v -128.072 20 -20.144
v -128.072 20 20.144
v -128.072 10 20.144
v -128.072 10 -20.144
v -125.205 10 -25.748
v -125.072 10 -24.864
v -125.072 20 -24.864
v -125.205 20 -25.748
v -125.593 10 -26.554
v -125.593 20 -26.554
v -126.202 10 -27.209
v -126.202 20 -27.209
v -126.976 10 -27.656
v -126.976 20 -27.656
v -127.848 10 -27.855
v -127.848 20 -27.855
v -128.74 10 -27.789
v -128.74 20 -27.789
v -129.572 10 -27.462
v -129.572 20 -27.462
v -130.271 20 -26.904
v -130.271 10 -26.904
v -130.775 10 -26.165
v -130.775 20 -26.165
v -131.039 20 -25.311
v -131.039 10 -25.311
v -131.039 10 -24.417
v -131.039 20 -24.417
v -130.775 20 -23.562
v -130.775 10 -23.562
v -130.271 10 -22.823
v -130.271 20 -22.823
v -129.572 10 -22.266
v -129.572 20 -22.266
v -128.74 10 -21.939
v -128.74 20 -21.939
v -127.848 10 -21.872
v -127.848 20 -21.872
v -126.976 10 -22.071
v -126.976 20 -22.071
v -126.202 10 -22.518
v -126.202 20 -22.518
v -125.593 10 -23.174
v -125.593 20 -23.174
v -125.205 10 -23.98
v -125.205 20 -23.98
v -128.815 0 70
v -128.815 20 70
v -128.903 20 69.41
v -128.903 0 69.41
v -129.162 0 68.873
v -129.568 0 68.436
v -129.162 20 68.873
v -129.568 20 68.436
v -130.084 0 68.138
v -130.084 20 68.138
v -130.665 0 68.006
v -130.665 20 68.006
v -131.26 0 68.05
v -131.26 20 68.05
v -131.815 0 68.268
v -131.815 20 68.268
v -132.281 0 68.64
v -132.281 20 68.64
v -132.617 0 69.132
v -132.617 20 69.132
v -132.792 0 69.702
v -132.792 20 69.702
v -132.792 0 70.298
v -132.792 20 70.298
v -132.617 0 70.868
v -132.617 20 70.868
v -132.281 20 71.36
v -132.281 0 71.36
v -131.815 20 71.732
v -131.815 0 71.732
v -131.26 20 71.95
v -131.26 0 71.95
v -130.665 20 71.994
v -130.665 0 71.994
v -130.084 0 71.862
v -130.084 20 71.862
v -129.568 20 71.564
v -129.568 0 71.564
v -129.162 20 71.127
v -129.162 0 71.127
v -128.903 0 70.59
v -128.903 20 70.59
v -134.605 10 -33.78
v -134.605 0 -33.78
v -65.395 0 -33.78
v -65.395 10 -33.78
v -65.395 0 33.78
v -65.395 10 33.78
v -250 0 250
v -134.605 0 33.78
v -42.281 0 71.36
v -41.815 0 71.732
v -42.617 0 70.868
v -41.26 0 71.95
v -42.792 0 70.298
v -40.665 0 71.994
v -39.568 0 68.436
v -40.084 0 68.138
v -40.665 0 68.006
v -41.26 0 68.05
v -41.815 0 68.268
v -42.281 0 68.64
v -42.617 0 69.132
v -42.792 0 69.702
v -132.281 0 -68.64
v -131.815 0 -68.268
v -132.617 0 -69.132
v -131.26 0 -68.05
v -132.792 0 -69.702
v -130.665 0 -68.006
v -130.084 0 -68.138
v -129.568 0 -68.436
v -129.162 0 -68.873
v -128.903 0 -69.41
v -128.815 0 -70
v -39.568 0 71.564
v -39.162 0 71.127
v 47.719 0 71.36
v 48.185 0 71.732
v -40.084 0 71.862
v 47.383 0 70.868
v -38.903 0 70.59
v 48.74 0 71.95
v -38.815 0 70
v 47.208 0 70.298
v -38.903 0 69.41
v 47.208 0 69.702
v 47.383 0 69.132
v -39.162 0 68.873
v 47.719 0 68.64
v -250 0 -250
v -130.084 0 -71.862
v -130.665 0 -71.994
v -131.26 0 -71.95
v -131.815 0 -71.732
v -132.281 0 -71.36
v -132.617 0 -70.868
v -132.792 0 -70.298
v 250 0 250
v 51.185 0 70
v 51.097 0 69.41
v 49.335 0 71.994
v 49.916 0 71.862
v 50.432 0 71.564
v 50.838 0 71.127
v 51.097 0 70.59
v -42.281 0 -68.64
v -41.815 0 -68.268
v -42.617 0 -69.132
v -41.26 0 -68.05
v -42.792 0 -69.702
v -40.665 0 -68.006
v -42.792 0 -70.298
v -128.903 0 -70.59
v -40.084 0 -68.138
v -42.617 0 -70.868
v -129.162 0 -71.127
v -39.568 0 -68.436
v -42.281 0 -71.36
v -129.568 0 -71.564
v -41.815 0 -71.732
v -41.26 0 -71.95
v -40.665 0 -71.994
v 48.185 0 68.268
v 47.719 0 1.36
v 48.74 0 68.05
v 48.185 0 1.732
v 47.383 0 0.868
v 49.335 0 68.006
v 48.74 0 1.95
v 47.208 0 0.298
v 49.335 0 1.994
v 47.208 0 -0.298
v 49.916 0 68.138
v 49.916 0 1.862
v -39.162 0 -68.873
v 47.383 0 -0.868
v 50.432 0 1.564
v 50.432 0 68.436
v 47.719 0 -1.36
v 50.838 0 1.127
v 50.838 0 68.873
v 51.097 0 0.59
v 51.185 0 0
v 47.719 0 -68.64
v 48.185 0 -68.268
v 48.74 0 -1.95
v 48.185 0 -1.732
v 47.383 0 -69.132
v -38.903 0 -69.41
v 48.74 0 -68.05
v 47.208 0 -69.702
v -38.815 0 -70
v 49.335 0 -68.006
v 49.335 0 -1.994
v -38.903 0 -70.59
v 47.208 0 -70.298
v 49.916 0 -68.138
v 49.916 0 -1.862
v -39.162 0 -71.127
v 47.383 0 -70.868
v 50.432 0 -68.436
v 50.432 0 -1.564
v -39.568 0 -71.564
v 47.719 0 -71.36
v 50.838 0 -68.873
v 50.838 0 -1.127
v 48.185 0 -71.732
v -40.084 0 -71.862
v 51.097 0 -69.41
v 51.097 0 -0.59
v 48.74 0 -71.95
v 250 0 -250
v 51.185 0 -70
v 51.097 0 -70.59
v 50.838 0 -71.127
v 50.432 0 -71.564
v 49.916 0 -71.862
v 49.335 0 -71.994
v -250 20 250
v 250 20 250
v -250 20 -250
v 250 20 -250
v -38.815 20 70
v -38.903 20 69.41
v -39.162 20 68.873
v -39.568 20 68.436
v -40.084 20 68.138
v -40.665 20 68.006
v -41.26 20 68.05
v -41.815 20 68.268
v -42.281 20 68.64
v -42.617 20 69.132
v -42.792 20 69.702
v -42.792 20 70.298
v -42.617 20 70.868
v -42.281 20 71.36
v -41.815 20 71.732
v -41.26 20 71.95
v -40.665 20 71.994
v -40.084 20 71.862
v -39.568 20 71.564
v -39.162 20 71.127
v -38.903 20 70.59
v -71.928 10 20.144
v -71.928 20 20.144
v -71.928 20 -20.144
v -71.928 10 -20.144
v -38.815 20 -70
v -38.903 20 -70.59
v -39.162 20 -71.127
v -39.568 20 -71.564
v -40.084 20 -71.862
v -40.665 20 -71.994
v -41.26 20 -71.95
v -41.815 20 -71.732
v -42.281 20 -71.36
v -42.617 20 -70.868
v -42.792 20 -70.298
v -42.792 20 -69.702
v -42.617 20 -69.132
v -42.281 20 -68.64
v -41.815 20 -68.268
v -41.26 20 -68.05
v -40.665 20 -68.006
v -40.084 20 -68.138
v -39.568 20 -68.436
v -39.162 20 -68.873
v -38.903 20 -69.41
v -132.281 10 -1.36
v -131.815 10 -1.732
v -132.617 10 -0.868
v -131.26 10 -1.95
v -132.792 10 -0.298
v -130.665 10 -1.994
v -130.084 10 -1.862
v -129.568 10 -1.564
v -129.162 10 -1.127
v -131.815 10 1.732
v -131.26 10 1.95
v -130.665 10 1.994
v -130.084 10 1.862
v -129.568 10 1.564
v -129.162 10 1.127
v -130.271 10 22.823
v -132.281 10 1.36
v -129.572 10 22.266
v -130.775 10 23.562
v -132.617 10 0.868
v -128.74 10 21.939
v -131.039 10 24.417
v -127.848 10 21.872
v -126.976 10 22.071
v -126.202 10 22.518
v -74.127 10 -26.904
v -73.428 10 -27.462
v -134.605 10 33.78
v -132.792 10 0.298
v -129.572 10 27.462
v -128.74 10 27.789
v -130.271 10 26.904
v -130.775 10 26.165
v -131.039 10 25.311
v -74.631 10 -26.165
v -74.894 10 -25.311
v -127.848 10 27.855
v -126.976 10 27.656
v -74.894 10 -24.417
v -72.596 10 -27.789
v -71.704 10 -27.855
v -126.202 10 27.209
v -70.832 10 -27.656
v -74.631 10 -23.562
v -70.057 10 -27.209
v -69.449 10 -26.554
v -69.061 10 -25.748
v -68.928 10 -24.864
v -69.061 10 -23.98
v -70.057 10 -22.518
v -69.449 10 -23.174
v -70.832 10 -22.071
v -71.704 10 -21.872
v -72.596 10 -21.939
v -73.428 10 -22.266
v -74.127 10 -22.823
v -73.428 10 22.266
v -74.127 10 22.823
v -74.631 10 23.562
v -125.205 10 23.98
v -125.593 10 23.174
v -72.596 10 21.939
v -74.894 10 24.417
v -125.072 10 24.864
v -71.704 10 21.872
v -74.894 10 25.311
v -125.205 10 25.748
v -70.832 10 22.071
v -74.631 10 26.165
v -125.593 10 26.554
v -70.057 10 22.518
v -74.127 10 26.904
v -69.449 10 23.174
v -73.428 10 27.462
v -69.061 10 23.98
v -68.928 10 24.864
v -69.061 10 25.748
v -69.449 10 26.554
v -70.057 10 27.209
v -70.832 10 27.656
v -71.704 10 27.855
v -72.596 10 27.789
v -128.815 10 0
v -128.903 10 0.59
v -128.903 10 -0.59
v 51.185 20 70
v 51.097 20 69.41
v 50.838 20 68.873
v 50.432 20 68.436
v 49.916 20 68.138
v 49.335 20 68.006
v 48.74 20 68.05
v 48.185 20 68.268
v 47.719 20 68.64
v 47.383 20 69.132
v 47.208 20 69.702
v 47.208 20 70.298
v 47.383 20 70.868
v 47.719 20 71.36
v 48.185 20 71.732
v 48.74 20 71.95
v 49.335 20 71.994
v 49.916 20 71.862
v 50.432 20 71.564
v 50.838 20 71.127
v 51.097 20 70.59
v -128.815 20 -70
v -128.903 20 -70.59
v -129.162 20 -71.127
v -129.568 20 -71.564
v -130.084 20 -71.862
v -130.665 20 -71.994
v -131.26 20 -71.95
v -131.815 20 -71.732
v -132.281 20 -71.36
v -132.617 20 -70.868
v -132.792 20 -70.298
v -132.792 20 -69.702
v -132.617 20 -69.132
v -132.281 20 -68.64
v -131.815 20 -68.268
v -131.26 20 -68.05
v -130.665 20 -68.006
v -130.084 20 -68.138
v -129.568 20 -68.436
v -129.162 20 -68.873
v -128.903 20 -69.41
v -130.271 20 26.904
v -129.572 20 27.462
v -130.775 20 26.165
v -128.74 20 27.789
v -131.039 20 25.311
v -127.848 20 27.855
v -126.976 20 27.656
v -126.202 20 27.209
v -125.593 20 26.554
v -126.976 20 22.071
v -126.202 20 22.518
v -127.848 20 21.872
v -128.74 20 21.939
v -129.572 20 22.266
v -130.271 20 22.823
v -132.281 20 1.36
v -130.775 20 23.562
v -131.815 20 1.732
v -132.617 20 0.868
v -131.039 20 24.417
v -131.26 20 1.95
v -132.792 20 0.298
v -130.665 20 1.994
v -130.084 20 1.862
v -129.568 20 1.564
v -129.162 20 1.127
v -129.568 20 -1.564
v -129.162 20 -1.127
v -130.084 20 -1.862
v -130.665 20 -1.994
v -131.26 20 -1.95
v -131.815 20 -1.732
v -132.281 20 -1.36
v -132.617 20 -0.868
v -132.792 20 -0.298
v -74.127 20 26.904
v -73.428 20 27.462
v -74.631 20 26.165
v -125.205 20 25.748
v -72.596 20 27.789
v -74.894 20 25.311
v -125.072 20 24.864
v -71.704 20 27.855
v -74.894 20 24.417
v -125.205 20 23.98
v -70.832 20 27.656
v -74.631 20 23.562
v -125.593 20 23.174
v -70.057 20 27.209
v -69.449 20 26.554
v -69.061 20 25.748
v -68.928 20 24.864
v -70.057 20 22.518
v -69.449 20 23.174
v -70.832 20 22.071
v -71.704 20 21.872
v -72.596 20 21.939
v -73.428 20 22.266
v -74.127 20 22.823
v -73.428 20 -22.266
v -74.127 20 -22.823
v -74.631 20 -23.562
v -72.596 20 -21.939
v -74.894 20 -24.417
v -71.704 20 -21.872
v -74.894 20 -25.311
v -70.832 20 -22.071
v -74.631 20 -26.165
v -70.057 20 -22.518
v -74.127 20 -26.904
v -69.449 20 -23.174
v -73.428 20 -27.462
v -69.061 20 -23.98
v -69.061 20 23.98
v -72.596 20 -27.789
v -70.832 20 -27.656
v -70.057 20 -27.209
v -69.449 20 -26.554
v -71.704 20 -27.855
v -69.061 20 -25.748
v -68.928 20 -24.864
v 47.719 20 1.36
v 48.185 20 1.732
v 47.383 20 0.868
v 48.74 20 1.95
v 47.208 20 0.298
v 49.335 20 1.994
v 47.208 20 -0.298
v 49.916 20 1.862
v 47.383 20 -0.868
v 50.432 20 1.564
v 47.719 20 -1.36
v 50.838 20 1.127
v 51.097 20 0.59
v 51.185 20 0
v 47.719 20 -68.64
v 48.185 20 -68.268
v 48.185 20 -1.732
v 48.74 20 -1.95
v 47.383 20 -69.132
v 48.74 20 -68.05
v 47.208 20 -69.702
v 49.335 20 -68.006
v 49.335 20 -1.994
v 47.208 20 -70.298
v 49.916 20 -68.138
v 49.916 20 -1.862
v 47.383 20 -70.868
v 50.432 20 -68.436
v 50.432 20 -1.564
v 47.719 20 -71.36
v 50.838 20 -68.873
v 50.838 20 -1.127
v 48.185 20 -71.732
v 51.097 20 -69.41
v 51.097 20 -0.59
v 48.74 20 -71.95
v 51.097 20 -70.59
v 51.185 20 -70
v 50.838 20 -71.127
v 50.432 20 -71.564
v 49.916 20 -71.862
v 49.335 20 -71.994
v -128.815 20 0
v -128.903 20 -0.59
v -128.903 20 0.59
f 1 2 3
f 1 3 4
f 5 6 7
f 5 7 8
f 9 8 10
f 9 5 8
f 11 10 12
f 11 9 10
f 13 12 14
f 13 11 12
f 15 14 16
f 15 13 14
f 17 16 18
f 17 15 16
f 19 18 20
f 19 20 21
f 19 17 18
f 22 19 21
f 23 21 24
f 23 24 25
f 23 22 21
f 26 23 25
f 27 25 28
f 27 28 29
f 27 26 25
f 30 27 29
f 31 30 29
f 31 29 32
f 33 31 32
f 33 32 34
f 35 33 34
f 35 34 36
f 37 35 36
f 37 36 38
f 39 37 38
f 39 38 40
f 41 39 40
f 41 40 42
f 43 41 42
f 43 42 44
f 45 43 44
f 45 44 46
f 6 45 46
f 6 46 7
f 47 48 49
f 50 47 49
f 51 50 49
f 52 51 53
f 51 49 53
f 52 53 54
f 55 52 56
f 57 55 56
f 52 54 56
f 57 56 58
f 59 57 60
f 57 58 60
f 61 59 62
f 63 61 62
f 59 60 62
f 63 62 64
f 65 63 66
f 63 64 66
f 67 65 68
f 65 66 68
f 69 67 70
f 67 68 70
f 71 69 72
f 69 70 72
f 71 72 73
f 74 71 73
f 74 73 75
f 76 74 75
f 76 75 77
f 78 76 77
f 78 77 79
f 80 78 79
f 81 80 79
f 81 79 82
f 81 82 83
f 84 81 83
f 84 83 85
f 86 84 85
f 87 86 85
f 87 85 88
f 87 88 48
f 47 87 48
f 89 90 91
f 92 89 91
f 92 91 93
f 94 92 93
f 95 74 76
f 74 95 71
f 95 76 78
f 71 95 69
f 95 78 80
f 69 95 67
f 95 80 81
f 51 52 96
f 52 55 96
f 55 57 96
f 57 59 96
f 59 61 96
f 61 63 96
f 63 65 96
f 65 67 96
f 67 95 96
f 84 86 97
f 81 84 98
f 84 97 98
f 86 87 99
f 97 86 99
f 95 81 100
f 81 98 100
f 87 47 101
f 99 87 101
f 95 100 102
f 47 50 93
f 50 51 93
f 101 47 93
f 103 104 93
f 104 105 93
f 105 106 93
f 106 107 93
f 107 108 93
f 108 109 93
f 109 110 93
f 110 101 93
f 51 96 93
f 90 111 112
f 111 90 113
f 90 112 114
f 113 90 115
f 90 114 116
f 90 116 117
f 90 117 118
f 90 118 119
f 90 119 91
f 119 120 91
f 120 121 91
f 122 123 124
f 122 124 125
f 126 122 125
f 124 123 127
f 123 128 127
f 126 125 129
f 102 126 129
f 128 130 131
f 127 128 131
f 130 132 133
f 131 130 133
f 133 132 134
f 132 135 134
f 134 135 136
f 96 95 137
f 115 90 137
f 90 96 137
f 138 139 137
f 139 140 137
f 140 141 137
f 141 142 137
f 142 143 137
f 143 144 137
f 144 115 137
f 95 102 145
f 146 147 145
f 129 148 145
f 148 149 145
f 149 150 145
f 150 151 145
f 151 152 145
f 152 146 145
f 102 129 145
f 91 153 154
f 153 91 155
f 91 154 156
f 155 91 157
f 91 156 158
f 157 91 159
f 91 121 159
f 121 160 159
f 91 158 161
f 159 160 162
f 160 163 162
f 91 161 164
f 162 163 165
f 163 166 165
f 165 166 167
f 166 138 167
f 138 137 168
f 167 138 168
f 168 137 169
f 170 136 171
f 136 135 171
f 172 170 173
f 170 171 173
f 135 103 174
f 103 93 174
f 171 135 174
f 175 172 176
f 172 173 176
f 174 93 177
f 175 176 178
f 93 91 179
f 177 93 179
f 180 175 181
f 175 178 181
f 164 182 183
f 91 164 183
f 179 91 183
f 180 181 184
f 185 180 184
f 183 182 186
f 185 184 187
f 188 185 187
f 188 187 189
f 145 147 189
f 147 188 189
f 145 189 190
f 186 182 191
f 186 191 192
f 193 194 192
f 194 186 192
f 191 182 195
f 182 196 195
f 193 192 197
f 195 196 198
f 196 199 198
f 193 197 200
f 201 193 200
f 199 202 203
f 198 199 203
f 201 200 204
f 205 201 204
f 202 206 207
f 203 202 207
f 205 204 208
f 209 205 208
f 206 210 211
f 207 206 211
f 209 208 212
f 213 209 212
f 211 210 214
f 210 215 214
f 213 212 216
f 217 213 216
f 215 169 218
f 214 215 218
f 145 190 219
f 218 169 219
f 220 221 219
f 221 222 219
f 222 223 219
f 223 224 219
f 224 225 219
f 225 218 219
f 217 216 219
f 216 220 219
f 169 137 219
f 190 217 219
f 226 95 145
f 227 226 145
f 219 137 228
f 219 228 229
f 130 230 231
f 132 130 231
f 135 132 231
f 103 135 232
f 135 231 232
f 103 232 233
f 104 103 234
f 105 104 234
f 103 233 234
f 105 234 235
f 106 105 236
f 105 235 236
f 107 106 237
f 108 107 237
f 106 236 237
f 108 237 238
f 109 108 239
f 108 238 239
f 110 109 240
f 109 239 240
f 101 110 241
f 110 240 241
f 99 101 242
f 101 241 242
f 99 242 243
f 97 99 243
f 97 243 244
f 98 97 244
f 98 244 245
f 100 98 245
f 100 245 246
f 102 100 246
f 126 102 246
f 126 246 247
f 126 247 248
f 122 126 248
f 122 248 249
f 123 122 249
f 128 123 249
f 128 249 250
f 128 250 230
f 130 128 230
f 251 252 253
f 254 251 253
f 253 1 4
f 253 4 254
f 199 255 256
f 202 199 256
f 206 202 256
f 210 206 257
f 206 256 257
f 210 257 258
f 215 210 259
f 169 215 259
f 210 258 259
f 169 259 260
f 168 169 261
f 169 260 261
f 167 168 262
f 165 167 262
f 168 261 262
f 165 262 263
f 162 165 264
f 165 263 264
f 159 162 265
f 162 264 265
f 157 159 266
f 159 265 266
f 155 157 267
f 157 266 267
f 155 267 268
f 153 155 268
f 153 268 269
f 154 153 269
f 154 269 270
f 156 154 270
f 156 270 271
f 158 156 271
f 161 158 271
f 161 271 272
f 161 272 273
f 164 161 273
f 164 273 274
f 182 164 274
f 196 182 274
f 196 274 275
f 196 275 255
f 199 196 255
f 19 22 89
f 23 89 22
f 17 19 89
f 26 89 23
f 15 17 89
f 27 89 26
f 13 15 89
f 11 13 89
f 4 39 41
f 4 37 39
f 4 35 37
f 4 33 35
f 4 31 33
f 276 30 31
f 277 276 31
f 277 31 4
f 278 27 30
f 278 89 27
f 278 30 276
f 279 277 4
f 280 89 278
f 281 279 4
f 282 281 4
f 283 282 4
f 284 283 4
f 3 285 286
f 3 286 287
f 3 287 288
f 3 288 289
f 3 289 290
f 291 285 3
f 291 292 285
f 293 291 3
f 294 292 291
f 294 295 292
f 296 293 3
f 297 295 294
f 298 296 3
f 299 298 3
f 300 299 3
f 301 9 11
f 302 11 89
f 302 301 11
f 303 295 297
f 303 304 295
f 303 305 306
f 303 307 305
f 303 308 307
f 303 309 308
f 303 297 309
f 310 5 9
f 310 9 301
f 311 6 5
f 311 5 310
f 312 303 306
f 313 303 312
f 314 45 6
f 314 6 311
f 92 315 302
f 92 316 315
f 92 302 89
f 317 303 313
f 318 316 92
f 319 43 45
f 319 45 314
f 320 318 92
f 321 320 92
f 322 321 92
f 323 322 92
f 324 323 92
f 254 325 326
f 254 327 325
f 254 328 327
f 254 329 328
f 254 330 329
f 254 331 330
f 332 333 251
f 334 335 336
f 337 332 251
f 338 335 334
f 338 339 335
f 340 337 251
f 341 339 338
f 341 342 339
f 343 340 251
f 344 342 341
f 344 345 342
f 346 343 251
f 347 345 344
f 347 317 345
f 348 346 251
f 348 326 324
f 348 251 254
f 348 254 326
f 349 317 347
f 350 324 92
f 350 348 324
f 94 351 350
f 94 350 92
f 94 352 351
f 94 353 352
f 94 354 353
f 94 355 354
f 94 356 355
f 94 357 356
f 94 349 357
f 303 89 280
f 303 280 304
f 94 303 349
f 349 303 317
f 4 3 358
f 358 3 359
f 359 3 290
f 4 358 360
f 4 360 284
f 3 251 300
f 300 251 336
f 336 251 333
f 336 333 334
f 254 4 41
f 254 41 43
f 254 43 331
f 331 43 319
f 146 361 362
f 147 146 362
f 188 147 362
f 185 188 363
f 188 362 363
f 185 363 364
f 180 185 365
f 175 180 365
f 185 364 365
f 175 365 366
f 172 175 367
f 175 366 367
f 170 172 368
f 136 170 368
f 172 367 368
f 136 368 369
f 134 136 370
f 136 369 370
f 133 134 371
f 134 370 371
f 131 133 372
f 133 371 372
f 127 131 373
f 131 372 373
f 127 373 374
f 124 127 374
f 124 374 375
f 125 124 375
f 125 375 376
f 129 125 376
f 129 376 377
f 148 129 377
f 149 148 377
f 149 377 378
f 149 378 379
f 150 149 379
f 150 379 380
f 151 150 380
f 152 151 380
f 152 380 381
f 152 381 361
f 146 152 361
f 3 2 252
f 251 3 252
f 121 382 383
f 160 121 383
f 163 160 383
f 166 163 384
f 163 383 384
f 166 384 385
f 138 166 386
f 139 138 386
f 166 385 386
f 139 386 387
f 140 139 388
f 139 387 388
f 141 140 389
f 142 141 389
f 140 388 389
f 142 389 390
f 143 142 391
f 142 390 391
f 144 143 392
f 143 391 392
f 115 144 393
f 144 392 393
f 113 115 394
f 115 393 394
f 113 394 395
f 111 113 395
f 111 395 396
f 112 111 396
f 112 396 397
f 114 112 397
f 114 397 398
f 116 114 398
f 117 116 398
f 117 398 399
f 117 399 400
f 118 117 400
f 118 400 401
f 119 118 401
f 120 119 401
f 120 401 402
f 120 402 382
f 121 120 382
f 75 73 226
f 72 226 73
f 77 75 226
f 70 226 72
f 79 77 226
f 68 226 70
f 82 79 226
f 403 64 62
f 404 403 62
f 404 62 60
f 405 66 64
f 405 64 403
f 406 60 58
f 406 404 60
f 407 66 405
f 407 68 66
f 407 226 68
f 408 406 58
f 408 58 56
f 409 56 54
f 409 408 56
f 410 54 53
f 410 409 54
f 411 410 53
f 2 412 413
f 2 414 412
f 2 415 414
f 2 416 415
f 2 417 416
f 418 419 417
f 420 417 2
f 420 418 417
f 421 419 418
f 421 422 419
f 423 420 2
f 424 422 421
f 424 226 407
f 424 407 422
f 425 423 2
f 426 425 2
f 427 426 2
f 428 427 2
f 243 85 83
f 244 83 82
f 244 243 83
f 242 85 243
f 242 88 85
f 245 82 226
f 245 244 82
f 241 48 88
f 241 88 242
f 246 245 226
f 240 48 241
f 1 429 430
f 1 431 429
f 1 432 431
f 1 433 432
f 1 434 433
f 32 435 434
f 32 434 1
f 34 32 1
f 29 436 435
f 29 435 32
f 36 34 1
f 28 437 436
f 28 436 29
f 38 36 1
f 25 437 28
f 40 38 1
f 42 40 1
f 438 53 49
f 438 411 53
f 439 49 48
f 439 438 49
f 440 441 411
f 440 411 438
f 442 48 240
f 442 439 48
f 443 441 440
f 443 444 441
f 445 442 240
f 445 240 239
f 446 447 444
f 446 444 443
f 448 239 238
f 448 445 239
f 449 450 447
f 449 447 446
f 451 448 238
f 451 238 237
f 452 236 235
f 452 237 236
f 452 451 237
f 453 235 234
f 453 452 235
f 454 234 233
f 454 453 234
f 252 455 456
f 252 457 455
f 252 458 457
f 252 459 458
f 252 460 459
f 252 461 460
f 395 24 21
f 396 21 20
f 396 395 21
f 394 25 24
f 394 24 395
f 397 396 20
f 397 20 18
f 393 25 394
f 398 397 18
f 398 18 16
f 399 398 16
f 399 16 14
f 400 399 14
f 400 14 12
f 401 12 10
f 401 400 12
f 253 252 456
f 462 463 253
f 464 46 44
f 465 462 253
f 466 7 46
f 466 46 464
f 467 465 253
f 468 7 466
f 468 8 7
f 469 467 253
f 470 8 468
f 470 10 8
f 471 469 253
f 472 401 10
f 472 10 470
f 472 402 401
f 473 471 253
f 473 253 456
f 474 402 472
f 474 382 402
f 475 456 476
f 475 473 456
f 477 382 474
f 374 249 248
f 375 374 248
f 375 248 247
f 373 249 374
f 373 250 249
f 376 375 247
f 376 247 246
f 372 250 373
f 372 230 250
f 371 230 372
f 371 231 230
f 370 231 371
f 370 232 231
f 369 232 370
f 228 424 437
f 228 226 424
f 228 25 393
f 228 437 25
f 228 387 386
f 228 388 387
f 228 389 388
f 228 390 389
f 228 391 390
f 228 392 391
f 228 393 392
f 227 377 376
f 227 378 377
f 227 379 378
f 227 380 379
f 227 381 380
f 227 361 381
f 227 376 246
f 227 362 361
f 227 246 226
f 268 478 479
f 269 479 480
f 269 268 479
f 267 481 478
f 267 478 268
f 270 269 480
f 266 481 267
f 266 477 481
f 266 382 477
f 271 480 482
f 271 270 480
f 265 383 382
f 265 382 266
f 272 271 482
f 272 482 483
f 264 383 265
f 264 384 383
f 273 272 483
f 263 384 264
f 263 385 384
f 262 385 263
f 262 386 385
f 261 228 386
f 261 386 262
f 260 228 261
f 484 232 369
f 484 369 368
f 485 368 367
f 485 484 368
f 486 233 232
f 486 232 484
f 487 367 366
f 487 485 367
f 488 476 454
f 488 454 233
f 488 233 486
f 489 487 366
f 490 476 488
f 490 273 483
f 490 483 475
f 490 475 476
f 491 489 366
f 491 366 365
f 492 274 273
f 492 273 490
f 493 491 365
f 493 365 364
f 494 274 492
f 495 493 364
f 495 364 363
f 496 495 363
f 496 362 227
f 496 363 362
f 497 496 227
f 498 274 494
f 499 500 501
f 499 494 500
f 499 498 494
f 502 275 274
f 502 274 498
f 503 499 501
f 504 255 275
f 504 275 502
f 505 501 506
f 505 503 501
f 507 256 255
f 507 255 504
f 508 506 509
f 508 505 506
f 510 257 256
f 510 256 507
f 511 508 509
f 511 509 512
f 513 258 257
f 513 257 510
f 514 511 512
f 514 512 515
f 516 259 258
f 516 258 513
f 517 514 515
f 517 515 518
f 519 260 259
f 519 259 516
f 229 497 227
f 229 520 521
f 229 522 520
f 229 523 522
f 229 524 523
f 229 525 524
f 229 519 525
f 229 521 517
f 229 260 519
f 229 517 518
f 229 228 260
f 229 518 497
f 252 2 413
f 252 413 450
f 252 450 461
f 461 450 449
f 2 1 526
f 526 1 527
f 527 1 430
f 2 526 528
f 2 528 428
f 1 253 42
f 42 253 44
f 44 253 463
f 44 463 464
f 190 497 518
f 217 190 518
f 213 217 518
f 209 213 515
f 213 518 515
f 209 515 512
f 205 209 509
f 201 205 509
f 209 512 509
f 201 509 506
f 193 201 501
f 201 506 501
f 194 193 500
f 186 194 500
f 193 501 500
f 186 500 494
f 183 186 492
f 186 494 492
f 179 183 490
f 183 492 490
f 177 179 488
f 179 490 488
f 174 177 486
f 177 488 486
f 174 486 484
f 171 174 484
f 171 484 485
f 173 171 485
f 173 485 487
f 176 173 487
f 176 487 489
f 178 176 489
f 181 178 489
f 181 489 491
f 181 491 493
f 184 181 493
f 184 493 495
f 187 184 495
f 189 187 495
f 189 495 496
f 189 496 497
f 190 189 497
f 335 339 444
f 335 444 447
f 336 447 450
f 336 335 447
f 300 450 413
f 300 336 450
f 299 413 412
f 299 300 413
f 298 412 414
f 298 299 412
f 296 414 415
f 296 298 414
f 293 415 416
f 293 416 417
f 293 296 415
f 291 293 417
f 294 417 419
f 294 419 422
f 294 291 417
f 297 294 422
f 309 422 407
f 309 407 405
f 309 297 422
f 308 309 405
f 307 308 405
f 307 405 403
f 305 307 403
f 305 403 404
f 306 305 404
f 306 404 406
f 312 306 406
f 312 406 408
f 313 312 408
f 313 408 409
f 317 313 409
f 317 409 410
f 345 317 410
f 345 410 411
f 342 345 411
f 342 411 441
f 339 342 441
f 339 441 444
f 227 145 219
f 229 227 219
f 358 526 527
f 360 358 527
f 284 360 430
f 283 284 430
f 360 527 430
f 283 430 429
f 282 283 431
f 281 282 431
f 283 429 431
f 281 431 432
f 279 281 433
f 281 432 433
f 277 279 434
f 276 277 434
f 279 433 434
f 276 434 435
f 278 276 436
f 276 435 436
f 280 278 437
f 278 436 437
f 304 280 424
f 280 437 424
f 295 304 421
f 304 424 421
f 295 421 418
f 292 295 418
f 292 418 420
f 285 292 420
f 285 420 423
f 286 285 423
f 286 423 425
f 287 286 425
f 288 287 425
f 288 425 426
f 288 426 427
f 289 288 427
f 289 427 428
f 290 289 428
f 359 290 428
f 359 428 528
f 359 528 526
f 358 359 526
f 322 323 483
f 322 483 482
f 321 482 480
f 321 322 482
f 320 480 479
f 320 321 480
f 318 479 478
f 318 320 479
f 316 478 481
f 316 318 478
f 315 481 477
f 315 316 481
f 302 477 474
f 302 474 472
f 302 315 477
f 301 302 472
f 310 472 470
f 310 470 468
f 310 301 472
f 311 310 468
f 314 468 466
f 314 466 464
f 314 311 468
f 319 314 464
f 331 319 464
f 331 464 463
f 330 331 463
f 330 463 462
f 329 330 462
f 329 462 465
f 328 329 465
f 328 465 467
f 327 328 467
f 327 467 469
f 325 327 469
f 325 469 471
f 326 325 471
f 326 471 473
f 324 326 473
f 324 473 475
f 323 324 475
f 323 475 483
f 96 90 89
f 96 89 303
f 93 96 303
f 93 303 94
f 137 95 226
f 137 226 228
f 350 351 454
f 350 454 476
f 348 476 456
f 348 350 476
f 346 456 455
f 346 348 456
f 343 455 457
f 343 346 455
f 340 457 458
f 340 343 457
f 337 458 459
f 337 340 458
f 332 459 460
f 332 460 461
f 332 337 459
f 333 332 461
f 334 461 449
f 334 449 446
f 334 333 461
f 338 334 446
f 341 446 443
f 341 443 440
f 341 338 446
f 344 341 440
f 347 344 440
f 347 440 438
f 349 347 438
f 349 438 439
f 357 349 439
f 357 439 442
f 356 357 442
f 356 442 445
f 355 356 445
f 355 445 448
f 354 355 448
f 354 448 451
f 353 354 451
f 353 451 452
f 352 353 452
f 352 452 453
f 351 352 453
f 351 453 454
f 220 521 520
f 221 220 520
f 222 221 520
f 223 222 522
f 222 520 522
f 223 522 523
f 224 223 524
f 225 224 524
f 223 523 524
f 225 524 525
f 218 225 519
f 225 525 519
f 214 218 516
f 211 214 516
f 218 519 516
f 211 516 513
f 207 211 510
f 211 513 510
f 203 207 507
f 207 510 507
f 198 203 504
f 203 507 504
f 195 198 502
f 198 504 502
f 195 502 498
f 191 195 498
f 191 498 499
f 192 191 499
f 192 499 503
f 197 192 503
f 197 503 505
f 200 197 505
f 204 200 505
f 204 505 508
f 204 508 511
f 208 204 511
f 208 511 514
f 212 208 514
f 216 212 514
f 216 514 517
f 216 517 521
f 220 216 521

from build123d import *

# Parameters (mm, degrees)
SKETCH1_W           = 500
SKETCH1_H           = 500
SKETCH1_R           = 3
BOSS_EXTRUDE1_DEPTH = 20
SKETCH2_W           = 56.144113512
SKETCH2_H           = 40.288527928
CUT_EXTRUDE2_DEPTH  = 21
SKETCH3_W           = 69.209848312
SKETCH3_H           = 67.559185152
CUT_EXTRUDE3_DEPTH  = 10
SKETCH4_R           = 2
CUT_EXTRUDE4_DEPTH  = 21


with BuildPart() as part:
    # Sketch1 → Boss-Extrude1 (new body)
    with BuildSketch(Plane(origin=(0, 0, 0), x_dir=(1, 0, 0), z_dir=(0, 1, 0))):
        Rectangle(SKETCH1_W, SKETCH1_H)
        with Locations((-128.072056756, 24.863821699)):
            Circle(SKETCH1_R, mode=Mode.SUBTRACT)
        with Locations((-71.927943244, 24.863821699)):
            Circle(SKETCH1_R, mode=Mode.SUBTRACT)
        with Locations((-71.927943244, -24.863821699)):
            Circle(SKETCH1_R, mode=Mode.SUBTRACT)
        with Locations((-128.072056756, -24.863821699)):
            Circle(SKETCH1_R, mode=Mode.SUBTRACT)
    extrude(amount=BOSS_EXTRUDE1_DEPTH)

    # Sketch2 → Cut-Extrude2 (cut, through all)
    with BuildSketch(Plane(origin=(0, 20, 0), x_dir=(1, 0, 0), z_dir=(0, 1, 0))):
        with Locations((-100, 0)):
            Rectangle(SKETCH2_W, SKETCH2_H)
    extrude(amount=-CUT_EXTRUDE2_DEPTH, mode=Mode.SUBTRACT)

    # Sketch3 → Cut-Extrude3 (cut)
    with BuildSketch(Plane.XZ):
        with Locations((-100, 0)):
            Rectangle(SKETCH3_W, SKETCH3_H)
    extrude(amount=-CUT_EXTRUDE3_DEPTH, mode=Mode.SUBTRACT)

    # Sketch4 → Cut-Extrude4 (cut, through all)
    with BuildSketch(Plane(origin=(0, 20, 0), x_dir=(1, 0, 0), z_dir=(0, 1, 0))):
        with Locations((-130.814569141, 70)):
            Circle(SKETCH4_R)
        with Locations((49.185430859, 70)):
            Circle(SKETCH4_R)
        with Locations((-40.814569141, 70)):
            Circle(SKETCH4_R)
        with Locations((-130.814569141, -70)):
            Circle(SKETCH4_R)
        with Locations((-40.814569141, -70)):
            Circle(SKETCH4_R)
        with Locations((49.185430859, -70)):
            Circle(SKETCH4_R)
        with Locations((49.185430859, 0)):
            Circle(SKETCH4_R)
        with Locations((-130.814569141, 0)):
            Circle(SKETCH4_R)
    extrude(amount=-CUT_EXTRUDE4_DEPTH, mode=Mode.SUBTRACT)


solid = part.part
